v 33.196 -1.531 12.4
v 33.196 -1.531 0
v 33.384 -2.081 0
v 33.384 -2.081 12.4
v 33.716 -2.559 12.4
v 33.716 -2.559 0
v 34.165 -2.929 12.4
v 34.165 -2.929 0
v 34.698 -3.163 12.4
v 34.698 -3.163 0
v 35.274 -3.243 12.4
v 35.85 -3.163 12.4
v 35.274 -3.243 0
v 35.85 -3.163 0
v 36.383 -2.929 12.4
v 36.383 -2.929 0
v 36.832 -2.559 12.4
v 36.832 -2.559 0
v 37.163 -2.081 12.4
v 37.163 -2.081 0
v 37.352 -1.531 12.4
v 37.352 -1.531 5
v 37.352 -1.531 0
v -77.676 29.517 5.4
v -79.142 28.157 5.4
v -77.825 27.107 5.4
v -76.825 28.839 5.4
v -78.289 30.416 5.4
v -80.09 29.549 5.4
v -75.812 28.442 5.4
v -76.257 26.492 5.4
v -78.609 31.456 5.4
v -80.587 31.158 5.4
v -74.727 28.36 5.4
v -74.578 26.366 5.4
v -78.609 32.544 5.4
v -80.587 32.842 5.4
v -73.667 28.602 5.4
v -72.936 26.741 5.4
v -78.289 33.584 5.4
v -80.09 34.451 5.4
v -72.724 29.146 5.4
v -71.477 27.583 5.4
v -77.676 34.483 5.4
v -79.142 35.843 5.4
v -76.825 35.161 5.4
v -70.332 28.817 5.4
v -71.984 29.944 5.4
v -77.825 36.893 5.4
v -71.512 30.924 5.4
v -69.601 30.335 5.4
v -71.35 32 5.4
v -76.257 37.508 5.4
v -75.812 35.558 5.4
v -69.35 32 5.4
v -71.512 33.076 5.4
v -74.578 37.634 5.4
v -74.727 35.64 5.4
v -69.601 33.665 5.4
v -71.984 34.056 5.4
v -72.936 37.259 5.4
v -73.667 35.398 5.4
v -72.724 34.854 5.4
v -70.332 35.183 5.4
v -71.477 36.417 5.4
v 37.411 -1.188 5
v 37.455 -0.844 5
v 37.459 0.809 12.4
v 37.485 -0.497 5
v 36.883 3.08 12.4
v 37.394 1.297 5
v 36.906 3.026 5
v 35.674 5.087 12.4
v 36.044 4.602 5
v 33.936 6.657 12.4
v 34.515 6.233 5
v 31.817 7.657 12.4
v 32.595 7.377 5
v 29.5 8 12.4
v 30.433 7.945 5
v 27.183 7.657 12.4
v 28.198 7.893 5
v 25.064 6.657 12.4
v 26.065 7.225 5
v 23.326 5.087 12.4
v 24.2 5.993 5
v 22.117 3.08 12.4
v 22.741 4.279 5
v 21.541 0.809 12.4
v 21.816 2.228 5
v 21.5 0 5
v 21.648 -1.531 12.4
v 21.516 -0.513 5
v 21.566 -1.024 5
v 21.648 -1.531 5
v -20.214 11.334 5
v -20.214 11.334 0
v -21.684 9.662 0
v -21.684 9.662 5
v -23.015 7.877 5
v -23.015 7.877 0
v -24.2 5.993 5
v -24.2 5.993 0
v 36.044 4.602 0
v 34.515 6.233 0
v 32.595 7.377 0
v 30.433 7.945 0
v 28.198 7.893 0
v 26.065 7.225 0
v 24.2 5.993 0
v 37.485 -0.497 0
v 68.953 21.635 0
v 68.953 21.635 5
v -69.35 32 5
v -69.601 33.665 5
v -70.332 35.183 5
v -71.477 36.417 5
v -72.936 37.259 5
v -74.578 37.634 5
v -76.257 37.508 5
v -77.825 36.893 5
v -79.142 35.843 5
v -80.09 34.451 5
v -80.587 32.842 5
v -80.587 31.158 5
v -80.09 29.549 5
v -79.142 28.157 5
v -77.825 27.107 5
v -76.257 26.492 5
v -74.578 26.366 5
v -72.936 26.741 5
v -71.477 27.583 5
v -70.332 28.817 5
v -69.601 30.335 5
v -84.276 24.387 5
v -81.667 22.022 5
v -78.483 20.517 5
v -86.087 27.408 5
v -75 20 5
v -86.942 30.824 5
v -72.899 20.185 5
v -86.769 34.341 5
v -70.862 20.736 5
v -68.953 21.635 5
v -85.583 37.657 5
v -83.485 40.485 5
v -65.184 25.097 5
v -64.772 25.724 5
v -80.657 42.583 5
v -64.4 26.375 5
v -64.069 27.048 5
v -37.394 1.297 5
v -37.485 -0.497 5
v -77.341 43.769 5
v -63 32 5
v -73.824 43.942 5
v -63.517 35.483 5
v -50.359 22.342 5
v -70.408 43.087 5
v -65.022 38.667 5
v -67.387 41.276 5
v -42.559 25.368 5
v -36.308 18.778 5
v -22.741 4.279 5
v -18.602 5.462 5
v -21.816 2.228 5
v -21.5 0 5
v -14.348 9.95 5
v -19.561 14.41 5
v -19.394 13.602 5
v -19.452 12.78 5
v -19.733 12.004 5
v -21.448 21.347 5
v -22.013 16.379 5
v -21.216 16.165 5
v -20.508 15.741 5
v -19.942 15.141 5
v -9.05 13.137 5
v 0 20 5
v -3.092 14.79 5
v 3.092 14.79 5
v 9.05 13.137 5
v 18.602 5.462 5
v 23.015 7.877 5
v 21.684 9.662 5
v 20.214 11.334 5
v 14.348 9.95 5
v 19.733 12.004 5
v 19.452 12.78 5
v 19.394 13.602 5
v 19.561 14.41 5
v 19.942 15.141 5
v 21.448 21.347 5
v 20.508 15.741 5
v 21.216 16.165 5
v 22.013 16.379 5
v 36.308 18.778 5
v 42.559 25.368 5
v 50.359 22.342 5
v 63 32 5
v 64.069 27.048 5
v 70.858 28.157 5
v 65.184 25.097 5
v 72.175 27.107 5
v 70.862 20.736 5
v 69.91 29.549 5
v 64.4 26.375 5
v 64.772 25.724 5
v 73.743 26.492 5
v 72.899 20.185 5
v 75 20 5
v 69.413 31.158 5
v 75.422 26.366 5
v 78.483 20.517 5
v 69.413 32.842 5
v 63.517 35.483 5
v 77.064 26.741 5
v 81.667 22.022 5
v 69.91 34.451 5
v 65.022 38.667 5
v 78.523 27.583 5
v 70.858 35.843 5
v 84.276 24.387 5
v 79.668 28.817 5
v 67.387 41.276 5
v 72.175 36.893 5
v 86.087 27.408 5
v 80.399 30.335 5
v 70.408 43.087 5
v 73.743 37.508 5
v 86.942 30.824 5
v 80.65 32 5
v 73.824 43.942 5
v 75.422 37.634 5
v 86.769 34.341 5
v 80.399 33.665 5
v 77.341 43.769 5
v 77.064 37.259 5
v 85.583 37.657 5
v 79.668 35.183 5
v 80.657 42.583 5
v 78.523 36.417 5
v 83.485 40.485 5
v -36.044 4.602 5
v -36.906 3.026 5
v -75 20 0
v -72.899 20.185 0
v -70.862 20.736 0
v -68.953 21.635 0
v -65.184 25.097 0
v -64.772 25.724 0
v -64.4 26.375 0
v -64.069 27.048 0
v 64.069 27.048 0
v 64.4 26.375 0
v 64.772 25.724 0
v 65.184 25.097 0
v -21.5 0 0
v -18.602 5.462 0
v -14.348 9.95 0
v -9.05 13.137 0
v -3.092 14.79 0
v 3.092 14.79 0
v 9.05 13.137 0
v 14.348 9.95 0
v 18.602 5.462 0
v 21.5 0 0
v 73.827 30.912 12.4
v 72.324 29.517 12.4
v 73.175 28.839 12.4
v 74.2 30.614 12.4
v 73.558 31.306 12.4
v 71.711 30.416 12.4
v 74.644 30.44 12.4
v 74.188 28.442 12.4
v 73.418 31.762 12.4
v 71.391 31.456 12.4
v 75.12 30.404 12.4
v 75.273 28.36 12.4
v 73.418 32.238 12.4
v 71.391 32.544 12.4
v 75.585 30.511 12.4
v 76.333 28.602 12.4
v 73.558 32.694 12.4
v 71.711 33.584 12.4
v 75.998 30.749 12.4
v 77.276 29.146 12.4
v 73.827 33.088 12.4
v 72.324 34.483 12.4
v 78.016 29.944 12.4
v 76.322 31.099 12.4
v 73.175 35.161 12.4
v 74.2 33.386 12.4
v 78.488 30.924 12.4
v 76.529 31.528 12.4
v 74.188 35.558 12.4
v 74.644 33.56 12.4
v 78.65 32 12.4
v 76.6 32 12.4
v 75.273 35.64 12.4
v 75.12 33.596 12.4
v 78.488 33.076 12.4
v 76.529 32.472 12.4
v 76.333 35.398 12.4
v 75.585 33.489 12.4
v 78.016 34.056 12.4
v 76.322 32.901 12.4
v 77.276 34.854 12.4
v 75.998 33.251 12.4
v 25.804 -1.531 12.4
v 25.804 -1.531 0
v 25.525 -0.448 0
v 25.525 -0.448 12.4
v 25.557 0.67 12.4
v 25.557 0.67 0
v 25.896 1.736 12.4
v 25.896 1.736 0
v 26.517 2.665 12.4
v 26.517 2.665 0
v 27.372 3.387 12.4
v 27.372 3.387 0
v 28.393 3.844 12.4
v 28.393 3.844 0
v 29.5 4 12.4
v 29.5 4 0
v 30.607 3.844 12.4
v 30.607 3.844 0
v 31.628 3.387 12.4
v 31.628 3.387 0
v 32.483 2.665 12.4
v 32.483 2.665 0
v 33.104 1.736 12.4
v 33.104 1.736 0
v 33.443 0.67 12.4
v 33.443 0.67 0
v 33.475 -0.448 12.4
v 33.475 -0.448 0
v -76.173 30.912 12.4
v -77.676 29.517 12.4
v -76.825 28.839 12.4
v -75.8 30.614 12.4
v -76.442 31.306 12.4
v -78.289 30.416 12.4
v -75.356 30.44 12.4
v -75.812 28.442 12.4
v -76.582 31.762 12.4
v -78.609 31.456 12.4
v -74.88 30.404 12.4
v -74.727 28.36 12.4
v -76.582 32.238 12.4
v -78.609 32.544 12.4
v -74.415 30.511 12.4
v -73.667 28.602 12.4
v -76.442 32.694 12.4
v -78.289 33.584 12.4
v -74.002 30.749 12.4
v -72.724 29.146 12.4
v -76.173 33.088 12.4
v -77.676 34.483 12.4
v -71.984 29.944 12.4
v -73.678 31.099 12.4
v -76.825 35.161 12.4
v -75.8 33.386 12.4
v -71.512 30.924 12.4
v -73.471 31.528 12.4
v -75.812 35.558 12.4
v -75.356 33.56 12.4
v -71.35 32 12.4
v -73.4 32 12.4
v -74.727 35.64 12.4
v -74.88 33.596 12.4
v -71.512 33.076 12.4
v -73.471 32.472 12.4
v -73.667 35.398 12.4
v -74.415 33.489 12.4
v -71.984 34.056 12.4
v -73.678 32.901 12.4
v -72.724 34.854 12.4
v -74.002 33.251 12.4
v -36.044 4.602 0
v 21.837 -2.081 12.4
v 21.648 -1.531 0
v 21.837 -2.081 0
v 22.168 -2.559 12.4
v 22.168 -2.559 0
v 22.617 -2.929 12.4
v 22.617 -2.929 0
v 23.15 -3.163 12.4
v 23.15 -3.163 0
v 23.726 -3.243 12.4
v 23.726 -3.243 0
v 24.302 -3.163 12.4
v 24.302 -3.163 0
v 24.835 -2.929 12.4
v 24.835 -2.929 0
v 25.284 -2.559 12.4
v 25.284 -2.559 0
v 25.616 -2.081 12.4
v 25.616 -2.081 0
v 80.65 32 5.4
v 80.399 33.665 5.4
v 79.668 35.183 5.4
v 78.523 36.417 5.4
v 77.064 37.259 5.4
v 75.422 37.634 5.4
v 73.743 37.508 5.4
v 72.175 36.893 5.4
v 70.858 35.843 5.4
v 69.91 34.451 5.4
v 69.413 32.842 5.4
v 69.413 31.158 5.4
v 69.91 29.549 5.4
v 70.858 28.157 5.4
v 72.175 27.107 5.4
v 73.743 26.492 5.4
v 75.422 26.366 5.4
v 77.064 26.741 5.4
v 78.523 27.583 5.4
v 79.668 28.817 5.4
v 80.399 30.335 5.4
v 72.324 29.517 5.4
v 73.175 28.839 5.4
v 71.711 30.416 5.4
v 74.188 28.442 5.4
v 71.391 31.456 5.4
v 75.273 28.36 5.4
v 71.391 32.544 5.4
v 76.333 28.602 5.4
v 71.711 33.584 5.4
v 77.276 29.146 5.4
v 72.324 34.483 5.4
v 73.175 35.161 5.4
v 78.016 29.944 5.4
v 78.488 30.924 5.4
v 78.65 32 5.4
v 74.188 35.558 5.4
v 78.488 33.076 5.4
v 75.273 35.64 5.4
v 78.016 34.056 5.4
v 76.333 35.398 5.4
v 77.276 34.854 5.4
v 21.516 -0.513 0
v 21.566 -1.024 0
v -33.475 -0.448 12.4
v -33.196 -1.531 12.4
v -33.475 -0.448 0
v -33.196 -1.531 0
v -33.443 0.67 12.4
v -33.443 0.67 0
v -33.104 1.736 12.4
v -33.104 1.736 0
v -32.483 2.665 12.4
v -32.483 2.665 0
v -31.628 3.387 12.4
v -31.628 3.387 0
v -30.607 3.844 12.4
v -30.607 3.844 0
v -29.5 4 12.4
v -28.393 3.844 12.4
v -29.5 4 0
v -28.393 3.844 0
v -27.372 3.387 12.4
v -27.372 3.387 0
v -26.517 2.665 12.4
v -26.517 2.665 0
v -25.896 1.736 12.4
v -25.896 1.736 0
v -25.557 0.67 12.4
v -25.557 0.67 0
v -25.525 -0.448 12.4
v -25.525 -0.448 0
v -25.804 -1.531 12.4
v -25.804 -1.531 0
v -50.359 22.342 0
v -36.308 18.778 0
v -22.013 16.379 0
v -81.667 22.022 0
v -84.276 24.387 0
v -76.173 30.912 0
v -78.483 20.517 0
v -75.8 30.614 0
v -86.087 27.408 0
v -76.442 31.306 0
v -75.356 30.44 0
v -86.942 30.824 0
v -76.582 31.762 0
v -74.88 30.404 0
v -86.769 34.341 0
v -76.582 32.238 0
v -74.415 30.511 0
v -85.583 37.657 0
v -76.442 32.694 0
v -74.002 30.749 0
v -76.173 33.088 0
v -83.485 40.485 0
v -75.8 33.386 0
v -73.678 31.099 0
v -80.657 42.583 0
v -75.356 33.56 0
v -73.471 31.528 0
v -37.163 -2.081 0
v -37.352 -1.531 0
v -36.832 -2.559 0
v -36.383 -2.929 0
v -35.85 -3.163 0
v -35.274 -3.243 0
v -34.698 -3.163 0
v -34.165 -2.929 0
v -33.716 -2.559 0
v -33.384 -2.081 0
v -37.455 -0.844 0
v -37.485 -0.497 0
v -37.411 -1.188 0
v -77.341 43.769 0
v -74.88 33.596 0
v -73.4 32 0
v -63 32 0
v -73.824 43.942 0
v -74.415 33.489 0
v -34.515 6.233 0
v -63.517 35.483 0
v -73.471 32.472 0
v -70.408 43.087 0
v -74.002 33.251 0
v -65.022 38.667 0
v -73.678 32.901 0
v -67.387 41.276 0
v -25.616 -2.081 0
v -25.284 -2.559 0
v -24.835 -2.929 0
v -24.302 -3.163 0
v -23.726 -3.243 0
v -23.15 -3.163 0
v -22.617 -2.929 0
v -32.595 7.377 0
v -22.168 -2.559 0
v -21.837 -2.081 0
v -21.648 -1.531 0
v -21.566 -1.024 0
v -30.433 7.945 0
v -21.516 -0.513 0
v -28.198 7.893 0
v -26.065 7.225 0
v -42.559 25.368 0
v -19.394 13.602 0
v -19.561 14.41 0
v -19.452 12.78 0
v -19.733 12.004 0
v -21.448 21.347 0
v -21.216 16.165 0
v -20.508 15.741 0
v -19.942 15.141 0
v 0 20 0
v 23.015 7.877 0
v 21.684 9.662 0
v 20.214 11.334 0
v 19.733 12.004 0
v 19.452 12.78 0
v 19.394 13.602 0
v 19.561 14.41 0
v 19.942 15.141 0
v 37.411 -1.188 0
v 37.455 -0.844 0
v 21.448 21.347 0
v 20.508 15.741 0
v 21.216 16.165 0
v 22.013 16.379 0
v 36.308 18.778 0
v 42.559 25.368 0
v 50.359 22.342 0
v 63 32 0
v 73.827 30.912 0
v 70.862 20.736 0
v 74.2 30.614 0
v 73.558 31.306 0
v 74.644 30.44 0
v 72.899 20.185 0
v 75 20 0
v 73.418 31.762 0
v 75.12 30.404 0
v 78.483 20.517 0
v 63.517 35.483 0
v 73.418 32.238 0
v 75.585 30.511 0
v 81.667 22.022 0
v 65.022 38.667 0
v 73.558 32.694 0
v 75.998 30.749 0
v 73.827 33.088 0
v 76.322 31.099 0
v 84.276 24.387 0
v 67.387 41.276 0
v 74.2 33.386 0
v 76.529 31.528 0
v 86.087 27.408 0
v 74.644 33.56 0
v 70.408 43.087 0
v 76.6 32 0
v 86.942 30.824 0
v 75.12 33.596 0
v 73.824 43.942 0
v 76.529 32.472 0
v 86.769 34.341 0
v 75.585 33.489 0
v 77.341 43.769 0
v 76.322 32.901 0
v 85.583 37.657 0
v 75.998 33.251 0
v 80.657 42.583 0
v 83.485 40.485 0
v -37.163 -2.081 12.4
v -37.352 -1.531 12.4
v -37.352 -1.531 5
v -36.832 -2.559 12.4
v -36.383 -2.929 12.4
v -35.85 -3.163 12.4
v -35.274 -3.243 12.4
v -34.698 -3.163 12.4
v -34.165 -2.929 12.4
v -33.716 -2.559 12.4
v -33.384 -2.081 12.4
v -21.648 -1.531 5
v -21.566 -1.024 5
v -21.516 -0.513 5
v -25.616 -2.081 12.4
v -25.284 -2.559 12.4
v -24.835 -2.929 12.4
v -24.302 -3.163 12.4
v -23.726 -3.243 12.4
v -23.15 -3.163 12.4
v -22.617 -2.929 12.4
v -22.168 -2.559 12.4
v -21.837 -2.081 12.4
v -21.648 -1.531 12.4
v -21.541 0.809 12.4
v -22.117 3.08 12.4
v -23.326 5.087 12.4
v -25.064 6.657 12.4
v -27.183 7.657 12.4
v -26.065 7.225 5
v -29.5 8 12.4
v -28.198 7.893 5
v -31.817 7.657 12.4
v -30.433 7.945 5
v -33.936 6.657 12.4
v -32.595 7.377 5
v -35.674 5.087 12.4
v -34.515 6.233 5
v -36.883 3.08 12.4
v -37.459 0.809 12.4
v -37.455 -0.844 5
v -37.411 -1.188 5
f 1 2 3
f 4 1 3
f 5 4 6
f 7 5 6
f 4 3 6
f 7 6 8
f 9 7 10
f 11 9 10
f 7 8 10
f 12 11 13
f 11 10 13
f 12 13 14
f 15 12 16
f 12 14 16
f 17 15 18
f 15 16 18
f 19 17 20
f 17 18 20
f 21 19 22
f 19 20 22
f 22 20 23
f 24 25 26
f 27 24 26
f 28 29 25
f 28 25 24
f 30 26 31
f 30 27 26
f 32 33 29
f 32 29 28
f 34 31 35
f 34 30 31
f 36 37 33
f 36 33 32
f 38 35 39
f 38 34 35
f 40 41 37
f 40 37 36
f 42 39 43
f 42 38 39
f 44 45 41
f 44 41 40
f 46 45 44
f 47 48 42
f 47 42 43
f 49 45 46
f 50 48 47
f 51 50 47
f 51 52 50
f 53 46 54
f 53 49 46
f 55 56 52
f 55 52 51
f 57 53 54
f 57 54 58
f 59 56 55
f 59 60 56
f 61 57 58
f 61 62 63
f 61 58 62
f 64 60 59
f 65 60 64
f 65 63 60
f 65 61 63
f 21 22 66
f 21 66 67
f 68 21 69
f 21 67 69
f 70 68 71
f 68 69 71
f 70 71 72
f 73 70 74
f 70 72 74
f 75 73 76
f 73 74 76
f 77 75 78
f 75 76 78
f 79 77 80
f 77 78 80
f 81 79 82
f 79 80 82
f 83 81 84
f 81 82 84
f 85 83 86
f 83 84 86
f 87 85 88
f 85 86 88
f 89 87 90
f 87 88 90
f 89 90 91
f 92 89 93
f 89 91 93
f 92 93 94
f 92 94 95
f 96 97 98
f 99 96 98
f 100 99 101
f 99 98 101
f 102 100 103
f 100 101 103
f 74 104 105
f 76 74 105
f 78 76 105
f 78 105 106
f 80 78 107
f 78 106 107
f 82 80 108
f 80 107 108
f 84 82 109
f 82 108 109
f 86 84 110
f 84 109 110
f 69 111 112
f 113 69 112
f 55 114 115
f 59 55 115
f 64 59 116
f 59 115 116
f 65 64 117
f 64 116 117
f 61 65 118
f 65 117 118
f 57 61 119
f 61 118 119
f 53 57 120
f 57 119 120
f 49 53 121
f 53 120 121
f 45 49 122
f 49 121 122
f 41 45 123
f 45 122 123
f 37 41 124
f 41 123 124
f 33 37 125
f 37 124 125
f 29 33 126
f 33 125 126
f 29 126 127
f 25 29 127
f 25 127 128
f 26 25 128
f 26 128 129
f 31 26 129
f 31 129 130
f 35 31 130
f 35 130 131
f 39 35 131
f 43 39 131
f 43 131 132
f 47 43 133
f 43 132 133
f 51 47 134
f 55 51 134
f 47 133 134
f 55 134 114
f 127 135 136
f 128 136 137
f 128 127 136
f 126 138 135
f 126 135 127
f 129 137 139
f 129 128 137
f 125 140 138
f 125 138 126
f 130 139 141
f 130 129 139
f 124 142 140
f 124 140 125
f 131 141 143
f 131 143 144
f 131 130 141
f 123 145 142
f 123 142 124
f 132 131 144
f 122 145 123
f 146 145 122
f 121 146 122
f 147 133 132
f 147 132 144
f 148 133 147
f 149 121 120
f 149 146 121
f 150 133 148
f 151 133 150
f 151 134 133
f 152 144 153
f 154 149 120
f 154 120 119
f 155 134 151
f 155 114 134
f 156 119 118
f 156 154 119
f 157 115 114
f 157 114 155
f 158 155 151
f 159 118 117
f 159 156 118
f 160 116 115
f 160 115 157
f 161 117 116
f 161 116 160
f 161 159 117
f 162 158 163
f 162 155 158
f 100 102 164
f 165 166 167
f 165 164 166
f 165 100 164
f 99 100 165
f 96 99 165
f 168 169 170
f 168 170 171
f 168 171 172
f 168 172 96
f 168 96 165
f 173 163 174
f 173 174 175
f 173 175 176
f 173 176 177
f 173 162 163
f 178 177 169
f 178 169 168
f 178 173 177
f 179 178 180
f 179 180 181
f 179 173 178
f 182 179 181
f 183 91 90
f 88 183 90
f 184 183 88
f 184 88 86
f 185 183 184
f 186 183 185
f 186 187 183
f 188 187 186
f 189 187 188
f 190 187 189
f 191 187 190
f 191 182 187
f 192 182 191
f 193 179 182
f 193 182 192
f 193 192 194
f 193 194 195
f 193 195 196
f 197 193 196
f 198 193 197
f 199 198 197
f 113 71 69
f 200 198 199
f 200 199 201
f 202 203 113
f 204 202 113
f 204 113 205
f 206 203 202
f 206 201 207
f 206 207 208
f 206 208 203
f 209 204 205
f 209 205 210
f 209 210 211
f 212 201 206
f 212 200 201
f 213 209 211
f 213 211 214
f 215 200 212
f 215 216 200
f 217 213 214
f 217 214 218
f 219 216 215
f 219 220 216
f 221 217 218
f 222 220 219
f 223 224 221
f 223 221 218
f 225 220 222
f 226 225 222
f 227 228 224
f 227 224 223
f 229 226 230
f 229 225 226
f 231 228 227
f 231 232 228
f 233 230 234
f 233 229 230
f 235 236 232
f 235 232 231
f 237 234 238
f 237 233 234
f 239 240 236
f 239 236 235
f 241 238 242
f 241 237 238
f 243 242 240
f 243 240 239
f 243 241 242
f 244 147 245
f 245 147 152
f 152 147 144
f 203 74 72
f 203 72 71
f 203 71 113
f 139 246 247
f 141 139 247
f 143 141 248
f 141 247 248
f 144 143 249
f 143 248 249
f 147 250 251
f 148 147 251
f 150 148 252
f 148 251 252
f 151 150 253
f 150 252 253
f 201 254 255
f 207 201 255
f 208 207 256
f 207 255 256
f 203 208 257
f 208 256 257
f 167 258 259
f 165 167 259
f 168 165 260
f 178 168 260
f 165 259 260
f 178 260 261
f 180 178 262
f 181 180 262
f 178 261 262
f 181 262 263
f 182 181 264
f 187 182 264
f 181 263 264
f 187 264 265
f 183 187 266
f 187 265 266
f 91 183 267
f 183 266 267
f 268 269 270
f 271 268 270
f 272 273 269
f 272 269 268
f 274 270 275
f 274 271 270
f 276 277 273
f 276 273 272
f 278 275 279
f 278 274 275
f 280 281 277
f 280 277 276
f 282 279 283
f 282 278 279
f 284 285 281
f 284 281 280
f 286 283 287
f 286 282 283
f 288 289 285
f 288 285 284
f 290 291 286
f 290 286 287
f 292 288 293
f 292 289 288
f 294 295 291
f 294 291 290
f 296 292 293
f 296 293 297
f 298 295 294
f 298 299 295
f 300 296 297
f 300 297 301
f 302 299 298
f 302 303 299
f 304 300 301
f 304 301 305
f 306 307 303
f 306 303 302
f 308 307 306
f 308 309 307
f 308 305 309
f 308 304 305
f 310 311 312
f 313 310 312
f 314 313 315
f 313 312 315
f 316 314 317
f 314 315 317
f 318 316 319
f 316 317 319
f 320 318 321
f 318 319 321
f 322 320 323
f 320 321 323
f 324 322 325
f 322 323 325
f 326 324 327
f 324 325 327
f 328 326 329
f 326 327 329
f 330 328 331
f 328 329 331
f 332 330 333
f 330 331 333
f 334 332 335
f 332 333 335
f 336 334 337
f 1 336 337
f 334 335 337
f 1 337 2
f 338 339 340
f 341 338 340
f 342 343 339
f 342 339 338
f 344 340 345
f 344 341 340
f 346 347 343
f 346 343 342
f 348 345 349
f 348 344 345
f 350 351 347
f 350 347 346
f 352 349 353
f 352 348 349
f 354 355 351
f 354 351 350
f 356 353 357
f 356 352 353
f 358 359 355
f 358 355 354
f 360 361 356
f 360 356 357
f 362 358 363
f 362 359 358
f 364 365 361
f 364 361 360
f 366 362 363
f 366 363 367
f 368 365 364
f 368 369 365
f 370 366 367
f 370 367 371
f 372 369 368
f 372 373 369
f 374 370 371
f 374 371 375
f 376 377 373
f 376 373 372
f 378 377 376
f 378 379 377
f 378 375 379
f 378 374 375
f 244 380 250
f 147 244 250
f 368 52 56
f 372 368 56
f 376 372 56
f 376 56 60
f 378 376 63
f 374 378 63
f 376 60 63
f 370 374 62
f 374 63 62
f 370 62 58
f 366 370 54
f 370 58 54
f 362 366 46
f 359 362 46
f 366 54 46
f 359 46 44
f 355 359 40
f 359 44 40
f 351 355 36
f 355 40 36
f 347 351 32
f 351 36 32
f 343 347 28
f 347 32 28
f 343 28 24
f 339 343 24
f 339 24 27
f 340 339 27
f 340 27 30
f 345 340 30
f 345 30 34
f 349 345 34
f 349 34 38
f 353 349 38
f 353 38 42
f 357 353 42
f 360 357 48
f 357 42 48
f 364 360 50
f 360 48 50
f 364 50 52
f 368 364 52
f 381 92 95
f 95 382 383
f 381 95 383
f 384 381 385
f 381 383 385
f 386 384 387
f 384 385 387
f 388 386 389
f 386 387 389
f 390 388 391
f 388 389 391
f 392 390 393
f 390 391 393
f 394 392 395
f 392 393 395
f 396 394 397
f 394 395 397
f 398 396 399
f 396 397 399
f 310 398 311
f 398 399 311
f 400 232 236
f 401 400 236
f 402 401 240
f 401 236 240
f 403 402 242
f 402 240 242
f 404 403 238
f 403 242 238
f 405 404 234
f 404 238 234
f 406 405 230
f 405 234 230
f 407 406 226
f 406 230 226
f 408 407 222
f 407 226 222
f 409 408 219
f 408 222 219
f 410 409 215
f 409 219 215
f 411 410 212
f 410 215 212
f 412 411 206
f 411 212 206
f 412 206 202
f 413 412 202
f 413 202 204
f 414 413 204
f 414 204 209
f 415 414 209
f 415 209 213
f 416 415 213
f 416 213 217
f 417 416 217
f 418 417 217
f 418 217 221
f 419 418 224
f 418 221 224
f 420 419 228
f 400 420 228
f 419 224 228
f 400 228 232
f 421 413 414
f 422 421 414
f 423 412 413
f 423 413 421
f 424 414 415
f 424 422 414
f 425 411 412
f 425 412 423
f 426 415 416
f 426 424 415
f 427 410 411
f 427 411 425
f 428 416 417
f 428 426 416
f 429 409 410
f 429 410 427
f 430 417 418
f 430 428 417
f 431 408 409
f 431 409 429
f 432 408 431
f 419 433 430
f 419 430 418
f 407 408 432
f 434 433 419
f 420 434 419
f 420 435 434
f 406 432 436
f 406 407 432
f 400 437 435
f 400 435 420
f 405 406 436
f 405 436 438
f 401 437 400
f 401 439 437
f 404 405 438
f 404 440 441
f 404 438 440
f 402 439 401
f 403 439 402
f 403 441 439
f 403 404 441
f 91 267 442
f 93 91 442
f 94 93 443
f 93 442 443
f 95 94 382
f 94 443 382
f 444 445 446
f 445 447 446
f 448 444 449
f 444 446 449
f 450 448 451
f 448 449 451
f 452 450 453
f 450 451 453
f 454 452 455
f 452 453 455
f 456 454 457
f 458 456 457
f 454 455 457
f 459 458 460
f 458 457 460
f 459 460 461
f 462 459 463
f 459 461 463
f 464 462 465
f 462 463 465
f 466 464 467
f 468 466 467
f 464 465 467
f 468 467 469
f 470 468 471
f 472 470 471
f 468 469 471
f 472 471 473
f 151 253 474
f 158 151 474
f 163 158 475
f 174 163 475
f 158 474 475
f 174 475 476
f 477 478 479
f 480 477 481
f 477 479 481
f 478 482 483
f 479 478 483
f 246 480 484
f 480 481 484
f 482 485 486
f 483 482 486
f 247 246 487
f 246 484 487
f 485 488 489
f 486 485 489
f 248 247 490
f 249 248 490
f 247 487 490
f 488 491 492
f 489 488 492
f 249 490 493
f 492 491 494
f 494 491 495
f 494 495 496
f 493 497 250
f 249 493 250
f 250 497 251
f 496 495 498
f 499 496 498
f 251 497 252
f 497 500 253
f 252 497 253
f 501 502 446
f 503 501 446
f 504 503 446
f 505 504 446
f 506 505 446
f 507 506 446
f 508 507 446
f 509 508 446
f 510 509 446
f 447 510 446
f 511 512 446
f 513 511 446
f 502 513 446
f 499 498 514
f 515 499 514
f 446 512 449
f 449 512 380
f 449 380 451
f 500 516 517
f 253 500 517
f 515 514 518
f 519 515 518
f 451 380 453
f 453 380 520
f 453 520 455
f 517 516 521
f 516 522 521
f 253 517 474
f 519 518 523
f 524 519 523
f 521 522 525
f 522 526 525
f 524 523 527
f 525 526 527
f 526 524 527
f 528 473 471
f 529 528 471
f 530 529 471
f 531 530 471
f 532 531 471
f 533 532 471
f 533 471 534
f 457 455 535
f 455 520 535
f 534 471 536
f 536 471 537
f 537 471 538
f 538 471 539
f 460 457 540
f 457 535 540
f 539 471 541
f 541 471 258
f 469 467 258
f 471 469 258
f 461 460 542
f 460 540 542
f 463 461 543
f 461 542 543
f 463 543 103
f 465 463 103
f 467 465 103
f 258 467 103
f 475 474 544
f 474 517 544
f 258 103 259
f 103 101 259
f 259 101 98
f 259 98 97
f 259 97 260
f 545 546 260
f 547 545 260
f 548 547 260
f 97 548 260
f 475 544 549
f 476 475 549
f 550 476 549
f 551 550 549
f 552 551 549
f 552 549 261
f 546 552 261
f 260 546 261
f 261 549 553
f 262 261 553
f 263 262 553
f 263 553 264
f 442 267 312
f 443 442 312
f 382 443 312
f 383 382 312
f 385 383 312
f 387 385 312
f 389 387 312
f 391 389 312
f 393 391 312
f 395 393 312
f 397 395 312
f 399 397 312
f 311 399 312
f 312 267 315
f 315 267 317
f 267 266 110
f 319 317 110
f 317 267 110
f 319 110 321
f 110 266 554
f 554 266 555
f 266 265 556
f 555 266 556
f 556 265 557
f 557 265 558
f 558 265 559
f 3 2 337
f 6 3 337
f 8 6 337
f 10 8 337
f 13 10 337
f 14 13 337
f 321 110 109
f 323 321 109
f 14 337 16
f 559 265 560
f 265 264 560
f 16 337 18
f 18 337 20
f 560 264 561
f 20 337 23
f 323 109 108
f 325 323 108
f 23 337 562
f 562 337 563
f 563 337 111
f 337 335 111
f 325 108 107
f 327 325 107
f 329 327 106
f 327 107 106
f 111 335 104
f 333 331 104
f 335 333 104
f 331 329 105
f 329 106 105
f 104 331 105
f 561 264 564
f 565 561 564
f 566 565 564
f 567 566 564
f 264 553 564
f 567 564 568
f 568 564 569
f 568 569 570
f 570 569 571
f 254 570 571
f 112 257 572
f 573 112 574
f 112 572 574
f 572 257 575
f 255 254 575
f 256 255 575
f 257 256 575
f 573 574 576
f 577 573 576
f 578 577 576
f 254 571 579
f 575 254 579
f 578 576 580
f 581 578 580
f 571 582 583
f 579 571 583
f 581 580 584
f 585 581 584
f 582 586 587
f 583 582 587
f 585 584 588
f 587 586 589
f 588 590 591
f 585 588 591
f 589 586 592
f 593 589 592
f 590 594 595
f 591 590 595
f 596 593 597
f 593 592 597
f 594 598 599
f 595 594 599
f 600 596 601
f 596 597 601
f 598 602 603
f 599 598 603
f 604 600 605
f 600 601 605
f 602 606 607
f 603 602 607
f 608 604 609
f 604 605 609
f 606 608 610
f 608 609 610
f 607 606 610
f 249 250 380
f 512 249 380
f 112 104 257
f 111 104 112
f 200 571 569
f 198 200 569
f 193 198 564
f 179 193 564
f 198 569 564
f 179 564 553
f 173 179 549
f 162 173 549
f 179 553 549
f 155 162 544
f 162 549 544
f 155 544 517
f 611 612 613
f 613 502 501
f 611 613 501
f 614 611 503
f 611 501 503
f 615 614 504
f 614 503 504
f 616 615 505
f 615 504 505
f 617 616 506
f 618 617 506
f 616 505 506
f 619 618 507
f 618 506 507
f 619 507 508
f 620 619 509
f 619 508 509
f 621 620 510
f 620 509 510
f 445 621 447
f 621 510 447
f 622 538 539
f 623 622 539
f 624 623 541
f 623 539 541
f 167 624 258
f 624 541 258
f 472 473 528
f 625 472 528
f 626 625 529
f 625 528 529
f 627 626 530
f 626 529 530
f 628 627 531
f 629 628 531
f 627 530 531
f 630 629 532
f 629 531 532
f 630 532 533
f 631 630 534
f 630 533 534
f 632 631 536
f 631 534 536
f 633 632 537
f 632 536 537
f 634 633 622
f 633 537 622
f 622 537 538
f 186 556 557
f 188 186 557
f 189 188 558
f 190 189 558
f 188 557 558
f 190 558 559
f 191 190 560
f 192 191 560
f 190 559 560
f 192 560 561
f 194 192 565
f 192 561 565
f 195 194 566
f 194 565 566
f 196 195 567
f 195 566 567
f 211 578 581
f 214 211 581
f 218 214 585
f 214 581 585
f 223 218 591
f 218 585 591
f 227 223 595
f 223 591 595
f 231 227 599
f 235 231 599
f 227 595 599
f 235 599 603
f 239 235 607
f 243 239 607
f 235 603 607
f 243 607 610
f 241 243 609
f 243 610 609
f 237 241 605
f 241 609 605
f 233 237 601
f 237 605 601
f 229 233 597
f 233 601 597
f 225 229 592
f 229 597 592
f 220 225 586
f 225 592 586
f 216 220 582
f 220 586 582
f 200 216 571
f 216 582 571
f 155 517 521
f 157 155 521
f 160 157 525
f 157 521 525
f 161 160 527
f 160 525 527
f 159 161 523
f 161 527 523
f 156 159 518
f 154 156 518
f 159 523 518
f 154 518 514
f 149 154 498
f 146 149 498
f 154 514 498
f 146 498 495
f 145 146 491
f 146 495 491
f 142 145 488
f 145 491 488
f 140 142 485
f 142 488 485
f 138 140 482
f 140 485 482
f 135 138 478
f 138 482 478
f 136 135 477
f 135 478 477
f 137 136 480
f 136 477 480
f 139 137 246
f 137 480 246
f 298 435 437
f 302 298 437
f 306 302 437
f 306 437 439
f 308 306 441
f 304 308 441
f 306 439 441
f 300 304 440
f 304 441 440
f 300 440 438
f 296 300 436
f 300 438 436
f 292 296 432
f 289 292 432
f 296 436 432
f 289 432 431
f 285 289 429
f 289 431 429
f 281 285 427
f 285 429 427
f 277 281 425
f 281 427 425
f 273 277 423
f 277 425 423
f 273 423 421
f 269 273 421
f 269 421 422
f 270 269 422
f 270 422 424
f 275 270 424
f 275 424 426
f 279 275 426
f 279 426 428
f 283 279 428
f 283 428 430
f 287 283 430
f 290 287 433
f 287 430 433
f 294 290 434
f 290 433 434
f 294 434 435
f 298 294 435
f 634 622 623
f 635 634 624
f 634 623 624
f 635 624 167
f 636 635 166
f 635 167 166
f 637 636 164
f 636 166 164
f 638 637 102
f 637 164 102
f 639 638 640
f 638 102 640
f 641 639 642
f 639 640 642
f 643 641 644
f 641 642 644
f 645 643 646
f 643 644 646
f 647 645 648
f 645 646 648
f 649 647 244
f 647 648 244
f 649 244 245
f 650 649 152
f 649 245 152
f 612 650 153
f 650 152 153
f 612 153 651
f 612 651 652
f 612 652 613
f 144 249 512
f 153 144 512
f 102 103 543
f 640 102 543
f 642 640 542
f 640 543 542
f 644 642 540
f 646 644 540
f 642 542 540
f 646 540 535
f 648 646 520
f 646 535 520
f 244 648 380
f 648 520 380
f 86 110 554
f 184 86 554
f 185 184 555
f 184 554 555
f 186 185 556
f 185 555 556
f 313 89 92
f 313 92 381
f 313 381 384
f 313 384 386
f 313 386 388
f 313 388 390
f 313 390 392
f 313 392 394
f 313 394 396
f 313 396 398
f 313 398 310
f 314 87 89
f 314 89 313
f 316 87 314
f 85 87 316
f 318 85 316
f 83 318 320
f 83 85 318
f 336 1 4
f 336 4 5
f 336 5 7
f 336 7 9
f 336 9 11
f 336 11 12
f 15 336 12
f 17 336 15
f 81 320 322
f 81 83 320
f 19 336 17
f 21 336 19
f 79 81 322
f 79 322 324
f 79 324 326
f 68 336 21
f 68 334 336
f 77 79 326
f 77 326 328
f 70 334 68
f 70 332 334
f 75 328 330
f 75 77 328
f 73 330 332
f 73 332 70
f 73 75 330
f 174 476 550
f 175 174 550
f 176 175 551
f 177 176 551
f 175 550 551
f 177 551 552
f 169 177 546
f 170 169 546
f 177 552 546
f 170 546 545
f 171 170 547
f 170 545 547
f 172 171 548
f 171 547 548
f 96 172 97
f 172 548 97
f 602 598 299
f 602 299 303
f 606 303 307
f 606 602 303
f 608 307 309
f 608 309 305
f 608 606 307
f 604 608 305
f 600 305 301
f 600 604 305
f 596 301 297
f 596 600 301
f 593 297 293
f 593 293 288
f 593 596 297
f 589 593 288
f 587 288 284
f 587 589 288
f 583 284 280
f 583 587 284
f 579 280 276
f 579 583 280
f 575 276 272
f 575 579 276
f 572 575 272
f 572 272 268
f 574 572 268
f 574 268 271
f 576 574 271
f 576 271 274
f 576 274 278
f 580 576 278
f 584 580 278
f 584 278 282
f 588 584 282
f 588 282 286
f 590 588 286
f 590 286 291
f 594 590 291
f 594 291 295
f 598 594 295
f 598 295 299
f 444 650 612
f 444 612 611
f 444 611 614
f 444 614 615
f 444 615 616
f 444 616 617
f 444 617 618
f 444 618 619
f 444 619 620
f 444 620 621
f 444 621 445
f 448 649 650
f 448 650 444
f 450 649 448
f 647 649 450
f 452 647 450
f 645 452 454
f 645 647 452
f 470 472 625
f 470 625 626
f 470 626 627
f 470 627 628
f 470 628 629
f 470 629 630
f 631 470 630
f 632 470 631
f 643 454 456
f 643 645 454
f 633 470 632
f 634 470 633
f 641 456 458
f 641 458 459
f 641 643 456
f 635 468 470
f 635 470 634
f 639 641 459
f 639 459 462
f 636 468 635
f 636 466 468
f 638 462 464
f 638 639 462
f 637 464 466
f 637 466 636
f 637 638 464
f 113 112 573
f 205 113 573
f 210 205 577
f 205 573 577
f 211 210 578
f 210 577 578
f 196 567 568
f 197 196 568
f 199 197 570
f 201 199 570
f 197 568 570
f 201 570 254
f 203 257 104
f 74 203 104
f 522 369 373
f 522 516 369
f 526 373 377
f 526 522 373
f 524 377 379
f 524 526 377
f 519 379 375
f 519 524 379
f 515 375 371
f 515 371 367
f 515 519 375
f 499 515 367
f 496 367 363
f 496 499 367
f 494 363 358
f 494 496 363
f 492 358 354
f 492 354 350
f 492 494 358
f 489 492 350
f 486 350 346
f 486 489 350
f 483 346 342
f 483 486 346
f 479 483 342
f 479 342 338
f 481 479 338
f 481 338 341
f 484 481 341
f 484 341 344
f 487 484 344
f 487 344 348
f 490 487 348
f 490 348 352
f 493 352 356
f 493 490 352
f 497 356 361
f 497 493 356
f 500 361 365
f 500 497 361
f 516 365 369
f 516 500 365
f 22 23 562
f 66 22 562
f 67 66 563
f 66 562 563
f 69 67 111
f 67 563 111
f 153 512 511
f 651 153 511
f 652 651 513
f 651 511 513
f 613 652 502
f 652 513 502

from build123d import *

# Parameters (mm, degrees)
F0_R     = 1.6
F1_DEPTH = 5
F2_R     = 5.65
F2_R_2   = 1.6
F3_DEPTH = 0.4
F4_R     = 3.65
F4_R_2   = 1.6
F5_DEPTH = 7
F7_DEPTH = 7.4


with BuildPart() as f1:
    # F0 (on Top) → F1 (new body)
    with BuildSketch(Plane.XY):
        with BuildLine():
            ThreePointArc((-37.3521878639, -1.5307337295), (-35.273852997, -3.2430337771), (-33.19551813, -1.5307337295))
            ThreePointArc((-33.19551813, -1.5307337295), (-29.5, 4), (-25.80448187, -1.5307337295))
            ThreePointArc((-25.80448187, -1.5307337295), (-23.726147003, -3.2430337771), (-21.6478121361, -1.5307337295))
            ThreePointArc((-21.6478121361, -1.5307337295), (-21.537038776, -0.7689268785), (-21.5, 0))
            ThreePointArc((-21.5, 0), (0, 15), (21.5, 0))
            ThreePointArc((21.5, 0), (21.537038776, -0.7689268785), (21.6478121361, -1.5307337295))
            ThreePointArc((21.6478121361, -1.5307337295), (23.726147003, -3.2430337771), (25.80448187, -1.5307337295))
            ThreePointArc((25.80448187, -1.5307337295), (29.5, 4), (33.19551813, -1.5307337295))
            ThreePointArc((33.19551813, -1.5307337295), (35.273852997, -3.2430337771), (37.3521878639, -1.5307337295))
            ThreePointArc((37.3521878639, -1.5307337295), (37.4352026436, -1.0161491059), (37.4845313984, -0.4972507899))
            Line((37.4845313984, -0.4972507899), (68.9534299936, 21.6347218485))
            ThreePointArc((68.9534299936, 21.6347218485), (71.8681744795, 20.4158872196), (75, 20))
            ThreePointArc((75, 20), (83.4852813742, 40.4852813742), (63, 32))
            ThreePointArc((63, 32), (0, 20), (-63, 32))
            ThreePointArc((-63, 32), (-83.4852813742, 40.4852813742), (-75, 20))
            ThreePointArc((-75, 20), (-71.8681744795, 20.4158872196), (-68.9534299936, 21.6347218485))
            Line((-68.9534299936, 21.6347218485), (-37.4845313984, -0.4972507899))
            ThreePointArc((-37.4845313984, -0.4972507899), (-37.4352026436, -1.0161491059), (-37.3521878639, -1.5307337295))
        make_face()
        with BuildLine():
            ThreePointArc((-65.1844431468, 25.0967512241), (-64.5810704237, 26.0463535136), (-64.0692832138, 27.0482901398))
            ThreePointArc((-64.0692832138, 27.0482901398), (-43.3702293382, 20.4154614181), (-22.0125035411, 16.3790277239))
            ThreePointArc((-22.0125035411, 16.3790277239), (-19.5611083836, 14.4098541759), (-20.2140176404, 11.3340303541))
            ThreePointArc((-20.2140176404, 11.3340303541), (-22.3670470232, 8.782690509), (-24.2000278476, 5.9925199361))
            ThreePointArc((-24.2000278476, 5.9925199361), (-30.4327318488, 7.9454396542), (-36.0437045688, 4.6021658506))
            Line((-36.0437045688, 4.6021658506), (-65.1844431468, 25.0967512241))
        make_face(mode=Mode.SUBTRACT)
        with BuildLine():
            ThreePointArc((20.2140176404, 11.3340303541), (19.5611083836, 14.4098541759), (22.0125035411, 16.3790277239))
            ThreePointArc((22.0125035411, 16.3790277239), (43.3702293382, 20.4154614181), (64.0692832138, 27.0482901398))
            ThreePointArc((64.0692832138, 27.0482901398), (64.5810704237, 26.0463535136), (65.1844431468, 25.0967512241))
            Line((65.1844431468, 25.0967512241), (36.0437045688, 4.6021658506))
            ThreePointArc((36.0437045688, 4.6021658506), (30.4327318488, 7.9454396542), (24.2000278476, 5.9925199361))
            ThreePointArc((24.2000278476, 5.9925199361), (22.3670470232, 8.782690509), (20.2140176404, 11.3340303541))
        make_face(mode=Mode.SUBTRACT)
        with Locations((-75, 32)):
            Circle(F0_R, mode=Mode.SUBTRACT)
        with Locations((75, 32)):
            Circle(F0_R, mode=Mode.SUBTRACT)
    extrude(amount=F1_DEPTH)

    # F2 (on face) → F3 (join)
    with BuildSketch(Plane.XY.offset(5)):
        with Locations((-75, 32)):
            Circle(F2_R)
        with Locations((-75, 32)):
            Circle(F2_R_2, mode=Mode.SUBTRACT)
        with Locations((75, 32)):
            Circle(F2_R)
        with Locations((75, 32)):
            Circle(F2_R_2, mode=Mode.SUBTRACT)
    extrude(amount=F3_DEPTH)

    # F4 (on face) → F5 (join)
    with BuildSketch(Plane.XY.offset(5.4)):
        with Locations((-75, 32)):
            Circle(F4_R)
        with Locations((-75, 32)):
            Circle(F4_R_2, mode=Mode.SUBTRACT)
        with Locations((75, 32)):
            Circle(F4_R)
        with Locations((75, 32)):
            Circle(F4_R_2, mode=Mode.SUBTRACT)
    extrude(amount=F5_DEPTH)

    # F6 (on face) → F7 (join, through all)
    with BuildSketch(Plane.XY.offset(5)):
        with BuildLine():
            ThreePointArc((-21.6478121361, -1.5307337295), (-29.5, 8), (-37.3521878639, -1.5307337295))
            ThreePointArc((-37.3521878639, -1.5307337295), (-35.273852997, -3.2430337771), (-33.19551813, -1.5307337295))
            ThreePointArc((-33.19551813, -1.5307337295), (-29.5, 4), (-25.80448187, -1.5307337295))
            ThreePointArc((-25.80448187, -1.5307337295), (-23.726147003, -3.2430337771), (-21.6478121361, -1.5307337295))
        make_face()
        with BuildLine():
            ThreePointArc((37.3521878639, -1.5307337295), (29.5, 8), (21.6478121361, -1.5307337295))
            ThreePointArc((21.6478121361, -1.5307337295), (23.726147003, -3.2430337771), (25.80448187, -1.5307337295))
            ThreePointArc((25.80448187, -1.5307337295), (29.5, 4), (33.19551813, -1.5307337295))
            ThreePointArc((33.19551813, -1.5307337295), (35.273852997, -3.2430337771), (37.3521878639, -1.5307337295))
        make_face()
    extrude(amount=F7_DEPTH)


solid = f1.part
